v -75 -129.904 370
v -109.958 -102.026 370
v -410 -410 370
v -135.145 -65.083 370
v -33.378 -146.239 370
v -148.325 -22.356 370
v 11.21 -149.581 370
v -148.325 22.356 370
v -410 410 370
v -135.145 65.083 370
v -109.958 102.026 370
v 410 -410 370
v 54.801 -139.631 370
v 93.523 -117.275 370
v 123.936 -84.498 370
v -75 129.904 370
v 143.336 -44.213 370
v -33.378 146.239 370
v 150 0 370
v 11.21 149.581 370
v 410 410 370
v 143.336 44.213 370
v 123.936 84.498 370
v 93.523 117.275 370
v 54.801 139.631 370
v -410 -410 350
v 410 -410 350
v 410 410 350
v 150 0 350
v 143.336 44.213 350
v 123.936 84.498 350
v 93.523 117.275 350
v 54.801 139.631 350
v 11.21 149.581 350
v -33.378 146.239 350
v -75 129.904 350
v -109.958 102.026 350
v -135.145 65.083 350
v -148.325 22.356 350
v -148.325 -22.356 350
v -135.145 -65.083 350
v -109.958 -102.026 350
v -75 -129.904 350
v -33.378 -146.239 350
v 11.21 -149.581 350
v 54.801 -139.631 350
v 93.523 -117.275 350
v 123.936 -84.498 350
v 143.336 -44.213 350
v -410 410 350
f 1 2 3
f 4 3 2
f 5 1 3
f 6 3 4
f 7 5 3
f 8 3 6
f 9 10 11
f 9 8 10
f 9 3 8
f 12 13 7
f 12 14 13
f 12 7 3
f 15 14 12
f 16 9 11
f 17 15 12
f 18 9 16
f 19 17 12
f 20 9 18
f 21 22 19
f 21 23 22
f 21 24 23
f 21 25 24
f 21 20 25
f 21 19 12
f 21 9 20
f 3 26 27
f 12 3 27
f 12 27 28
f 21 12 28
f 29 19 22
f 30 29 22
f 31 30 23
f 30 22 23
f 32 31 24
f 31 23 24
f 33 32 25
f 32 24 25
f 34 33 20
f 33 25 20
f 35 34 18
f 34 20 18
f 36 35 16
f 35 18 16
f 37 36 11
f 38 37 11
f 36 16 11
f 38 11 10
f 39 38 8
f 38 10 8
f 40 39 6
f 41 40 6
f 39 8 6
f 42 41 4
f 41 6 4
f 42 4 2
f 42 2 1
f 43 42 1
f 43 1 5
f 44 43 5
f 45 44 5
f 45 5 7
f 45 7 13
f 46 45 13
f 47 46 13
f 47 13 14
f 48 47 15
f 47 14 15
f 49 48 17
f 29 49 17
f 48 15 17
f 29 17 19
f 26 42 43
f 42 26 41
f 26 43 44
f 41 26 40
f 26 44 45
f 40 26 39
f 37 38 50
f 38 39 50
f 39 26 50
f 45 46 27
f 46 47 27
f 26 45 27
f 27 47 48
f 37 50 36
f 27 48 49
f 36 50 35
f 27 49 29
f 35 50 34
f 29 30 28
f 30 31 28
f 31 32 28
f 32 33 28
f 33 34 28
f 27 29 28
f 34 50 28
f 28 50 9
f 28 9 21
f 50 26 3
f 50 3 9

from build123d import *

# Parameters (mm, degrees)
SKETCH015_R      = 150
EXTRUDE011_DEPTH = 20
SKETCH014_W      = 820
SKETCH014_H      = 820
EXTRUDE009_DEPTH = 20


with BuildPart() as extrude013:
    # Sketch015 (on Face6 of Extrude009) → Extrude011 (new body)
    with BuildSketch(Plane.XY.offset(370)):
        Circle(SKETCH015_R)
    extrude(amount=-EXTRUDE011_DEPTH)


with BuildPart() as cut006:
    # Sketch014 (on Face8 of Extrude) → Extrude009 (new body)
    with BuildSketch(Plane.XY.offset(350)):
        Rectangle(SKETCH014_W, SKETCH014_H)
    extrude(amount=EXTRUDE009_DEPTH)

    # Cut006: cut Extrude013
    add(extrude013.part, mode=Mode.SUBTRACT)


solid = cut006.part
